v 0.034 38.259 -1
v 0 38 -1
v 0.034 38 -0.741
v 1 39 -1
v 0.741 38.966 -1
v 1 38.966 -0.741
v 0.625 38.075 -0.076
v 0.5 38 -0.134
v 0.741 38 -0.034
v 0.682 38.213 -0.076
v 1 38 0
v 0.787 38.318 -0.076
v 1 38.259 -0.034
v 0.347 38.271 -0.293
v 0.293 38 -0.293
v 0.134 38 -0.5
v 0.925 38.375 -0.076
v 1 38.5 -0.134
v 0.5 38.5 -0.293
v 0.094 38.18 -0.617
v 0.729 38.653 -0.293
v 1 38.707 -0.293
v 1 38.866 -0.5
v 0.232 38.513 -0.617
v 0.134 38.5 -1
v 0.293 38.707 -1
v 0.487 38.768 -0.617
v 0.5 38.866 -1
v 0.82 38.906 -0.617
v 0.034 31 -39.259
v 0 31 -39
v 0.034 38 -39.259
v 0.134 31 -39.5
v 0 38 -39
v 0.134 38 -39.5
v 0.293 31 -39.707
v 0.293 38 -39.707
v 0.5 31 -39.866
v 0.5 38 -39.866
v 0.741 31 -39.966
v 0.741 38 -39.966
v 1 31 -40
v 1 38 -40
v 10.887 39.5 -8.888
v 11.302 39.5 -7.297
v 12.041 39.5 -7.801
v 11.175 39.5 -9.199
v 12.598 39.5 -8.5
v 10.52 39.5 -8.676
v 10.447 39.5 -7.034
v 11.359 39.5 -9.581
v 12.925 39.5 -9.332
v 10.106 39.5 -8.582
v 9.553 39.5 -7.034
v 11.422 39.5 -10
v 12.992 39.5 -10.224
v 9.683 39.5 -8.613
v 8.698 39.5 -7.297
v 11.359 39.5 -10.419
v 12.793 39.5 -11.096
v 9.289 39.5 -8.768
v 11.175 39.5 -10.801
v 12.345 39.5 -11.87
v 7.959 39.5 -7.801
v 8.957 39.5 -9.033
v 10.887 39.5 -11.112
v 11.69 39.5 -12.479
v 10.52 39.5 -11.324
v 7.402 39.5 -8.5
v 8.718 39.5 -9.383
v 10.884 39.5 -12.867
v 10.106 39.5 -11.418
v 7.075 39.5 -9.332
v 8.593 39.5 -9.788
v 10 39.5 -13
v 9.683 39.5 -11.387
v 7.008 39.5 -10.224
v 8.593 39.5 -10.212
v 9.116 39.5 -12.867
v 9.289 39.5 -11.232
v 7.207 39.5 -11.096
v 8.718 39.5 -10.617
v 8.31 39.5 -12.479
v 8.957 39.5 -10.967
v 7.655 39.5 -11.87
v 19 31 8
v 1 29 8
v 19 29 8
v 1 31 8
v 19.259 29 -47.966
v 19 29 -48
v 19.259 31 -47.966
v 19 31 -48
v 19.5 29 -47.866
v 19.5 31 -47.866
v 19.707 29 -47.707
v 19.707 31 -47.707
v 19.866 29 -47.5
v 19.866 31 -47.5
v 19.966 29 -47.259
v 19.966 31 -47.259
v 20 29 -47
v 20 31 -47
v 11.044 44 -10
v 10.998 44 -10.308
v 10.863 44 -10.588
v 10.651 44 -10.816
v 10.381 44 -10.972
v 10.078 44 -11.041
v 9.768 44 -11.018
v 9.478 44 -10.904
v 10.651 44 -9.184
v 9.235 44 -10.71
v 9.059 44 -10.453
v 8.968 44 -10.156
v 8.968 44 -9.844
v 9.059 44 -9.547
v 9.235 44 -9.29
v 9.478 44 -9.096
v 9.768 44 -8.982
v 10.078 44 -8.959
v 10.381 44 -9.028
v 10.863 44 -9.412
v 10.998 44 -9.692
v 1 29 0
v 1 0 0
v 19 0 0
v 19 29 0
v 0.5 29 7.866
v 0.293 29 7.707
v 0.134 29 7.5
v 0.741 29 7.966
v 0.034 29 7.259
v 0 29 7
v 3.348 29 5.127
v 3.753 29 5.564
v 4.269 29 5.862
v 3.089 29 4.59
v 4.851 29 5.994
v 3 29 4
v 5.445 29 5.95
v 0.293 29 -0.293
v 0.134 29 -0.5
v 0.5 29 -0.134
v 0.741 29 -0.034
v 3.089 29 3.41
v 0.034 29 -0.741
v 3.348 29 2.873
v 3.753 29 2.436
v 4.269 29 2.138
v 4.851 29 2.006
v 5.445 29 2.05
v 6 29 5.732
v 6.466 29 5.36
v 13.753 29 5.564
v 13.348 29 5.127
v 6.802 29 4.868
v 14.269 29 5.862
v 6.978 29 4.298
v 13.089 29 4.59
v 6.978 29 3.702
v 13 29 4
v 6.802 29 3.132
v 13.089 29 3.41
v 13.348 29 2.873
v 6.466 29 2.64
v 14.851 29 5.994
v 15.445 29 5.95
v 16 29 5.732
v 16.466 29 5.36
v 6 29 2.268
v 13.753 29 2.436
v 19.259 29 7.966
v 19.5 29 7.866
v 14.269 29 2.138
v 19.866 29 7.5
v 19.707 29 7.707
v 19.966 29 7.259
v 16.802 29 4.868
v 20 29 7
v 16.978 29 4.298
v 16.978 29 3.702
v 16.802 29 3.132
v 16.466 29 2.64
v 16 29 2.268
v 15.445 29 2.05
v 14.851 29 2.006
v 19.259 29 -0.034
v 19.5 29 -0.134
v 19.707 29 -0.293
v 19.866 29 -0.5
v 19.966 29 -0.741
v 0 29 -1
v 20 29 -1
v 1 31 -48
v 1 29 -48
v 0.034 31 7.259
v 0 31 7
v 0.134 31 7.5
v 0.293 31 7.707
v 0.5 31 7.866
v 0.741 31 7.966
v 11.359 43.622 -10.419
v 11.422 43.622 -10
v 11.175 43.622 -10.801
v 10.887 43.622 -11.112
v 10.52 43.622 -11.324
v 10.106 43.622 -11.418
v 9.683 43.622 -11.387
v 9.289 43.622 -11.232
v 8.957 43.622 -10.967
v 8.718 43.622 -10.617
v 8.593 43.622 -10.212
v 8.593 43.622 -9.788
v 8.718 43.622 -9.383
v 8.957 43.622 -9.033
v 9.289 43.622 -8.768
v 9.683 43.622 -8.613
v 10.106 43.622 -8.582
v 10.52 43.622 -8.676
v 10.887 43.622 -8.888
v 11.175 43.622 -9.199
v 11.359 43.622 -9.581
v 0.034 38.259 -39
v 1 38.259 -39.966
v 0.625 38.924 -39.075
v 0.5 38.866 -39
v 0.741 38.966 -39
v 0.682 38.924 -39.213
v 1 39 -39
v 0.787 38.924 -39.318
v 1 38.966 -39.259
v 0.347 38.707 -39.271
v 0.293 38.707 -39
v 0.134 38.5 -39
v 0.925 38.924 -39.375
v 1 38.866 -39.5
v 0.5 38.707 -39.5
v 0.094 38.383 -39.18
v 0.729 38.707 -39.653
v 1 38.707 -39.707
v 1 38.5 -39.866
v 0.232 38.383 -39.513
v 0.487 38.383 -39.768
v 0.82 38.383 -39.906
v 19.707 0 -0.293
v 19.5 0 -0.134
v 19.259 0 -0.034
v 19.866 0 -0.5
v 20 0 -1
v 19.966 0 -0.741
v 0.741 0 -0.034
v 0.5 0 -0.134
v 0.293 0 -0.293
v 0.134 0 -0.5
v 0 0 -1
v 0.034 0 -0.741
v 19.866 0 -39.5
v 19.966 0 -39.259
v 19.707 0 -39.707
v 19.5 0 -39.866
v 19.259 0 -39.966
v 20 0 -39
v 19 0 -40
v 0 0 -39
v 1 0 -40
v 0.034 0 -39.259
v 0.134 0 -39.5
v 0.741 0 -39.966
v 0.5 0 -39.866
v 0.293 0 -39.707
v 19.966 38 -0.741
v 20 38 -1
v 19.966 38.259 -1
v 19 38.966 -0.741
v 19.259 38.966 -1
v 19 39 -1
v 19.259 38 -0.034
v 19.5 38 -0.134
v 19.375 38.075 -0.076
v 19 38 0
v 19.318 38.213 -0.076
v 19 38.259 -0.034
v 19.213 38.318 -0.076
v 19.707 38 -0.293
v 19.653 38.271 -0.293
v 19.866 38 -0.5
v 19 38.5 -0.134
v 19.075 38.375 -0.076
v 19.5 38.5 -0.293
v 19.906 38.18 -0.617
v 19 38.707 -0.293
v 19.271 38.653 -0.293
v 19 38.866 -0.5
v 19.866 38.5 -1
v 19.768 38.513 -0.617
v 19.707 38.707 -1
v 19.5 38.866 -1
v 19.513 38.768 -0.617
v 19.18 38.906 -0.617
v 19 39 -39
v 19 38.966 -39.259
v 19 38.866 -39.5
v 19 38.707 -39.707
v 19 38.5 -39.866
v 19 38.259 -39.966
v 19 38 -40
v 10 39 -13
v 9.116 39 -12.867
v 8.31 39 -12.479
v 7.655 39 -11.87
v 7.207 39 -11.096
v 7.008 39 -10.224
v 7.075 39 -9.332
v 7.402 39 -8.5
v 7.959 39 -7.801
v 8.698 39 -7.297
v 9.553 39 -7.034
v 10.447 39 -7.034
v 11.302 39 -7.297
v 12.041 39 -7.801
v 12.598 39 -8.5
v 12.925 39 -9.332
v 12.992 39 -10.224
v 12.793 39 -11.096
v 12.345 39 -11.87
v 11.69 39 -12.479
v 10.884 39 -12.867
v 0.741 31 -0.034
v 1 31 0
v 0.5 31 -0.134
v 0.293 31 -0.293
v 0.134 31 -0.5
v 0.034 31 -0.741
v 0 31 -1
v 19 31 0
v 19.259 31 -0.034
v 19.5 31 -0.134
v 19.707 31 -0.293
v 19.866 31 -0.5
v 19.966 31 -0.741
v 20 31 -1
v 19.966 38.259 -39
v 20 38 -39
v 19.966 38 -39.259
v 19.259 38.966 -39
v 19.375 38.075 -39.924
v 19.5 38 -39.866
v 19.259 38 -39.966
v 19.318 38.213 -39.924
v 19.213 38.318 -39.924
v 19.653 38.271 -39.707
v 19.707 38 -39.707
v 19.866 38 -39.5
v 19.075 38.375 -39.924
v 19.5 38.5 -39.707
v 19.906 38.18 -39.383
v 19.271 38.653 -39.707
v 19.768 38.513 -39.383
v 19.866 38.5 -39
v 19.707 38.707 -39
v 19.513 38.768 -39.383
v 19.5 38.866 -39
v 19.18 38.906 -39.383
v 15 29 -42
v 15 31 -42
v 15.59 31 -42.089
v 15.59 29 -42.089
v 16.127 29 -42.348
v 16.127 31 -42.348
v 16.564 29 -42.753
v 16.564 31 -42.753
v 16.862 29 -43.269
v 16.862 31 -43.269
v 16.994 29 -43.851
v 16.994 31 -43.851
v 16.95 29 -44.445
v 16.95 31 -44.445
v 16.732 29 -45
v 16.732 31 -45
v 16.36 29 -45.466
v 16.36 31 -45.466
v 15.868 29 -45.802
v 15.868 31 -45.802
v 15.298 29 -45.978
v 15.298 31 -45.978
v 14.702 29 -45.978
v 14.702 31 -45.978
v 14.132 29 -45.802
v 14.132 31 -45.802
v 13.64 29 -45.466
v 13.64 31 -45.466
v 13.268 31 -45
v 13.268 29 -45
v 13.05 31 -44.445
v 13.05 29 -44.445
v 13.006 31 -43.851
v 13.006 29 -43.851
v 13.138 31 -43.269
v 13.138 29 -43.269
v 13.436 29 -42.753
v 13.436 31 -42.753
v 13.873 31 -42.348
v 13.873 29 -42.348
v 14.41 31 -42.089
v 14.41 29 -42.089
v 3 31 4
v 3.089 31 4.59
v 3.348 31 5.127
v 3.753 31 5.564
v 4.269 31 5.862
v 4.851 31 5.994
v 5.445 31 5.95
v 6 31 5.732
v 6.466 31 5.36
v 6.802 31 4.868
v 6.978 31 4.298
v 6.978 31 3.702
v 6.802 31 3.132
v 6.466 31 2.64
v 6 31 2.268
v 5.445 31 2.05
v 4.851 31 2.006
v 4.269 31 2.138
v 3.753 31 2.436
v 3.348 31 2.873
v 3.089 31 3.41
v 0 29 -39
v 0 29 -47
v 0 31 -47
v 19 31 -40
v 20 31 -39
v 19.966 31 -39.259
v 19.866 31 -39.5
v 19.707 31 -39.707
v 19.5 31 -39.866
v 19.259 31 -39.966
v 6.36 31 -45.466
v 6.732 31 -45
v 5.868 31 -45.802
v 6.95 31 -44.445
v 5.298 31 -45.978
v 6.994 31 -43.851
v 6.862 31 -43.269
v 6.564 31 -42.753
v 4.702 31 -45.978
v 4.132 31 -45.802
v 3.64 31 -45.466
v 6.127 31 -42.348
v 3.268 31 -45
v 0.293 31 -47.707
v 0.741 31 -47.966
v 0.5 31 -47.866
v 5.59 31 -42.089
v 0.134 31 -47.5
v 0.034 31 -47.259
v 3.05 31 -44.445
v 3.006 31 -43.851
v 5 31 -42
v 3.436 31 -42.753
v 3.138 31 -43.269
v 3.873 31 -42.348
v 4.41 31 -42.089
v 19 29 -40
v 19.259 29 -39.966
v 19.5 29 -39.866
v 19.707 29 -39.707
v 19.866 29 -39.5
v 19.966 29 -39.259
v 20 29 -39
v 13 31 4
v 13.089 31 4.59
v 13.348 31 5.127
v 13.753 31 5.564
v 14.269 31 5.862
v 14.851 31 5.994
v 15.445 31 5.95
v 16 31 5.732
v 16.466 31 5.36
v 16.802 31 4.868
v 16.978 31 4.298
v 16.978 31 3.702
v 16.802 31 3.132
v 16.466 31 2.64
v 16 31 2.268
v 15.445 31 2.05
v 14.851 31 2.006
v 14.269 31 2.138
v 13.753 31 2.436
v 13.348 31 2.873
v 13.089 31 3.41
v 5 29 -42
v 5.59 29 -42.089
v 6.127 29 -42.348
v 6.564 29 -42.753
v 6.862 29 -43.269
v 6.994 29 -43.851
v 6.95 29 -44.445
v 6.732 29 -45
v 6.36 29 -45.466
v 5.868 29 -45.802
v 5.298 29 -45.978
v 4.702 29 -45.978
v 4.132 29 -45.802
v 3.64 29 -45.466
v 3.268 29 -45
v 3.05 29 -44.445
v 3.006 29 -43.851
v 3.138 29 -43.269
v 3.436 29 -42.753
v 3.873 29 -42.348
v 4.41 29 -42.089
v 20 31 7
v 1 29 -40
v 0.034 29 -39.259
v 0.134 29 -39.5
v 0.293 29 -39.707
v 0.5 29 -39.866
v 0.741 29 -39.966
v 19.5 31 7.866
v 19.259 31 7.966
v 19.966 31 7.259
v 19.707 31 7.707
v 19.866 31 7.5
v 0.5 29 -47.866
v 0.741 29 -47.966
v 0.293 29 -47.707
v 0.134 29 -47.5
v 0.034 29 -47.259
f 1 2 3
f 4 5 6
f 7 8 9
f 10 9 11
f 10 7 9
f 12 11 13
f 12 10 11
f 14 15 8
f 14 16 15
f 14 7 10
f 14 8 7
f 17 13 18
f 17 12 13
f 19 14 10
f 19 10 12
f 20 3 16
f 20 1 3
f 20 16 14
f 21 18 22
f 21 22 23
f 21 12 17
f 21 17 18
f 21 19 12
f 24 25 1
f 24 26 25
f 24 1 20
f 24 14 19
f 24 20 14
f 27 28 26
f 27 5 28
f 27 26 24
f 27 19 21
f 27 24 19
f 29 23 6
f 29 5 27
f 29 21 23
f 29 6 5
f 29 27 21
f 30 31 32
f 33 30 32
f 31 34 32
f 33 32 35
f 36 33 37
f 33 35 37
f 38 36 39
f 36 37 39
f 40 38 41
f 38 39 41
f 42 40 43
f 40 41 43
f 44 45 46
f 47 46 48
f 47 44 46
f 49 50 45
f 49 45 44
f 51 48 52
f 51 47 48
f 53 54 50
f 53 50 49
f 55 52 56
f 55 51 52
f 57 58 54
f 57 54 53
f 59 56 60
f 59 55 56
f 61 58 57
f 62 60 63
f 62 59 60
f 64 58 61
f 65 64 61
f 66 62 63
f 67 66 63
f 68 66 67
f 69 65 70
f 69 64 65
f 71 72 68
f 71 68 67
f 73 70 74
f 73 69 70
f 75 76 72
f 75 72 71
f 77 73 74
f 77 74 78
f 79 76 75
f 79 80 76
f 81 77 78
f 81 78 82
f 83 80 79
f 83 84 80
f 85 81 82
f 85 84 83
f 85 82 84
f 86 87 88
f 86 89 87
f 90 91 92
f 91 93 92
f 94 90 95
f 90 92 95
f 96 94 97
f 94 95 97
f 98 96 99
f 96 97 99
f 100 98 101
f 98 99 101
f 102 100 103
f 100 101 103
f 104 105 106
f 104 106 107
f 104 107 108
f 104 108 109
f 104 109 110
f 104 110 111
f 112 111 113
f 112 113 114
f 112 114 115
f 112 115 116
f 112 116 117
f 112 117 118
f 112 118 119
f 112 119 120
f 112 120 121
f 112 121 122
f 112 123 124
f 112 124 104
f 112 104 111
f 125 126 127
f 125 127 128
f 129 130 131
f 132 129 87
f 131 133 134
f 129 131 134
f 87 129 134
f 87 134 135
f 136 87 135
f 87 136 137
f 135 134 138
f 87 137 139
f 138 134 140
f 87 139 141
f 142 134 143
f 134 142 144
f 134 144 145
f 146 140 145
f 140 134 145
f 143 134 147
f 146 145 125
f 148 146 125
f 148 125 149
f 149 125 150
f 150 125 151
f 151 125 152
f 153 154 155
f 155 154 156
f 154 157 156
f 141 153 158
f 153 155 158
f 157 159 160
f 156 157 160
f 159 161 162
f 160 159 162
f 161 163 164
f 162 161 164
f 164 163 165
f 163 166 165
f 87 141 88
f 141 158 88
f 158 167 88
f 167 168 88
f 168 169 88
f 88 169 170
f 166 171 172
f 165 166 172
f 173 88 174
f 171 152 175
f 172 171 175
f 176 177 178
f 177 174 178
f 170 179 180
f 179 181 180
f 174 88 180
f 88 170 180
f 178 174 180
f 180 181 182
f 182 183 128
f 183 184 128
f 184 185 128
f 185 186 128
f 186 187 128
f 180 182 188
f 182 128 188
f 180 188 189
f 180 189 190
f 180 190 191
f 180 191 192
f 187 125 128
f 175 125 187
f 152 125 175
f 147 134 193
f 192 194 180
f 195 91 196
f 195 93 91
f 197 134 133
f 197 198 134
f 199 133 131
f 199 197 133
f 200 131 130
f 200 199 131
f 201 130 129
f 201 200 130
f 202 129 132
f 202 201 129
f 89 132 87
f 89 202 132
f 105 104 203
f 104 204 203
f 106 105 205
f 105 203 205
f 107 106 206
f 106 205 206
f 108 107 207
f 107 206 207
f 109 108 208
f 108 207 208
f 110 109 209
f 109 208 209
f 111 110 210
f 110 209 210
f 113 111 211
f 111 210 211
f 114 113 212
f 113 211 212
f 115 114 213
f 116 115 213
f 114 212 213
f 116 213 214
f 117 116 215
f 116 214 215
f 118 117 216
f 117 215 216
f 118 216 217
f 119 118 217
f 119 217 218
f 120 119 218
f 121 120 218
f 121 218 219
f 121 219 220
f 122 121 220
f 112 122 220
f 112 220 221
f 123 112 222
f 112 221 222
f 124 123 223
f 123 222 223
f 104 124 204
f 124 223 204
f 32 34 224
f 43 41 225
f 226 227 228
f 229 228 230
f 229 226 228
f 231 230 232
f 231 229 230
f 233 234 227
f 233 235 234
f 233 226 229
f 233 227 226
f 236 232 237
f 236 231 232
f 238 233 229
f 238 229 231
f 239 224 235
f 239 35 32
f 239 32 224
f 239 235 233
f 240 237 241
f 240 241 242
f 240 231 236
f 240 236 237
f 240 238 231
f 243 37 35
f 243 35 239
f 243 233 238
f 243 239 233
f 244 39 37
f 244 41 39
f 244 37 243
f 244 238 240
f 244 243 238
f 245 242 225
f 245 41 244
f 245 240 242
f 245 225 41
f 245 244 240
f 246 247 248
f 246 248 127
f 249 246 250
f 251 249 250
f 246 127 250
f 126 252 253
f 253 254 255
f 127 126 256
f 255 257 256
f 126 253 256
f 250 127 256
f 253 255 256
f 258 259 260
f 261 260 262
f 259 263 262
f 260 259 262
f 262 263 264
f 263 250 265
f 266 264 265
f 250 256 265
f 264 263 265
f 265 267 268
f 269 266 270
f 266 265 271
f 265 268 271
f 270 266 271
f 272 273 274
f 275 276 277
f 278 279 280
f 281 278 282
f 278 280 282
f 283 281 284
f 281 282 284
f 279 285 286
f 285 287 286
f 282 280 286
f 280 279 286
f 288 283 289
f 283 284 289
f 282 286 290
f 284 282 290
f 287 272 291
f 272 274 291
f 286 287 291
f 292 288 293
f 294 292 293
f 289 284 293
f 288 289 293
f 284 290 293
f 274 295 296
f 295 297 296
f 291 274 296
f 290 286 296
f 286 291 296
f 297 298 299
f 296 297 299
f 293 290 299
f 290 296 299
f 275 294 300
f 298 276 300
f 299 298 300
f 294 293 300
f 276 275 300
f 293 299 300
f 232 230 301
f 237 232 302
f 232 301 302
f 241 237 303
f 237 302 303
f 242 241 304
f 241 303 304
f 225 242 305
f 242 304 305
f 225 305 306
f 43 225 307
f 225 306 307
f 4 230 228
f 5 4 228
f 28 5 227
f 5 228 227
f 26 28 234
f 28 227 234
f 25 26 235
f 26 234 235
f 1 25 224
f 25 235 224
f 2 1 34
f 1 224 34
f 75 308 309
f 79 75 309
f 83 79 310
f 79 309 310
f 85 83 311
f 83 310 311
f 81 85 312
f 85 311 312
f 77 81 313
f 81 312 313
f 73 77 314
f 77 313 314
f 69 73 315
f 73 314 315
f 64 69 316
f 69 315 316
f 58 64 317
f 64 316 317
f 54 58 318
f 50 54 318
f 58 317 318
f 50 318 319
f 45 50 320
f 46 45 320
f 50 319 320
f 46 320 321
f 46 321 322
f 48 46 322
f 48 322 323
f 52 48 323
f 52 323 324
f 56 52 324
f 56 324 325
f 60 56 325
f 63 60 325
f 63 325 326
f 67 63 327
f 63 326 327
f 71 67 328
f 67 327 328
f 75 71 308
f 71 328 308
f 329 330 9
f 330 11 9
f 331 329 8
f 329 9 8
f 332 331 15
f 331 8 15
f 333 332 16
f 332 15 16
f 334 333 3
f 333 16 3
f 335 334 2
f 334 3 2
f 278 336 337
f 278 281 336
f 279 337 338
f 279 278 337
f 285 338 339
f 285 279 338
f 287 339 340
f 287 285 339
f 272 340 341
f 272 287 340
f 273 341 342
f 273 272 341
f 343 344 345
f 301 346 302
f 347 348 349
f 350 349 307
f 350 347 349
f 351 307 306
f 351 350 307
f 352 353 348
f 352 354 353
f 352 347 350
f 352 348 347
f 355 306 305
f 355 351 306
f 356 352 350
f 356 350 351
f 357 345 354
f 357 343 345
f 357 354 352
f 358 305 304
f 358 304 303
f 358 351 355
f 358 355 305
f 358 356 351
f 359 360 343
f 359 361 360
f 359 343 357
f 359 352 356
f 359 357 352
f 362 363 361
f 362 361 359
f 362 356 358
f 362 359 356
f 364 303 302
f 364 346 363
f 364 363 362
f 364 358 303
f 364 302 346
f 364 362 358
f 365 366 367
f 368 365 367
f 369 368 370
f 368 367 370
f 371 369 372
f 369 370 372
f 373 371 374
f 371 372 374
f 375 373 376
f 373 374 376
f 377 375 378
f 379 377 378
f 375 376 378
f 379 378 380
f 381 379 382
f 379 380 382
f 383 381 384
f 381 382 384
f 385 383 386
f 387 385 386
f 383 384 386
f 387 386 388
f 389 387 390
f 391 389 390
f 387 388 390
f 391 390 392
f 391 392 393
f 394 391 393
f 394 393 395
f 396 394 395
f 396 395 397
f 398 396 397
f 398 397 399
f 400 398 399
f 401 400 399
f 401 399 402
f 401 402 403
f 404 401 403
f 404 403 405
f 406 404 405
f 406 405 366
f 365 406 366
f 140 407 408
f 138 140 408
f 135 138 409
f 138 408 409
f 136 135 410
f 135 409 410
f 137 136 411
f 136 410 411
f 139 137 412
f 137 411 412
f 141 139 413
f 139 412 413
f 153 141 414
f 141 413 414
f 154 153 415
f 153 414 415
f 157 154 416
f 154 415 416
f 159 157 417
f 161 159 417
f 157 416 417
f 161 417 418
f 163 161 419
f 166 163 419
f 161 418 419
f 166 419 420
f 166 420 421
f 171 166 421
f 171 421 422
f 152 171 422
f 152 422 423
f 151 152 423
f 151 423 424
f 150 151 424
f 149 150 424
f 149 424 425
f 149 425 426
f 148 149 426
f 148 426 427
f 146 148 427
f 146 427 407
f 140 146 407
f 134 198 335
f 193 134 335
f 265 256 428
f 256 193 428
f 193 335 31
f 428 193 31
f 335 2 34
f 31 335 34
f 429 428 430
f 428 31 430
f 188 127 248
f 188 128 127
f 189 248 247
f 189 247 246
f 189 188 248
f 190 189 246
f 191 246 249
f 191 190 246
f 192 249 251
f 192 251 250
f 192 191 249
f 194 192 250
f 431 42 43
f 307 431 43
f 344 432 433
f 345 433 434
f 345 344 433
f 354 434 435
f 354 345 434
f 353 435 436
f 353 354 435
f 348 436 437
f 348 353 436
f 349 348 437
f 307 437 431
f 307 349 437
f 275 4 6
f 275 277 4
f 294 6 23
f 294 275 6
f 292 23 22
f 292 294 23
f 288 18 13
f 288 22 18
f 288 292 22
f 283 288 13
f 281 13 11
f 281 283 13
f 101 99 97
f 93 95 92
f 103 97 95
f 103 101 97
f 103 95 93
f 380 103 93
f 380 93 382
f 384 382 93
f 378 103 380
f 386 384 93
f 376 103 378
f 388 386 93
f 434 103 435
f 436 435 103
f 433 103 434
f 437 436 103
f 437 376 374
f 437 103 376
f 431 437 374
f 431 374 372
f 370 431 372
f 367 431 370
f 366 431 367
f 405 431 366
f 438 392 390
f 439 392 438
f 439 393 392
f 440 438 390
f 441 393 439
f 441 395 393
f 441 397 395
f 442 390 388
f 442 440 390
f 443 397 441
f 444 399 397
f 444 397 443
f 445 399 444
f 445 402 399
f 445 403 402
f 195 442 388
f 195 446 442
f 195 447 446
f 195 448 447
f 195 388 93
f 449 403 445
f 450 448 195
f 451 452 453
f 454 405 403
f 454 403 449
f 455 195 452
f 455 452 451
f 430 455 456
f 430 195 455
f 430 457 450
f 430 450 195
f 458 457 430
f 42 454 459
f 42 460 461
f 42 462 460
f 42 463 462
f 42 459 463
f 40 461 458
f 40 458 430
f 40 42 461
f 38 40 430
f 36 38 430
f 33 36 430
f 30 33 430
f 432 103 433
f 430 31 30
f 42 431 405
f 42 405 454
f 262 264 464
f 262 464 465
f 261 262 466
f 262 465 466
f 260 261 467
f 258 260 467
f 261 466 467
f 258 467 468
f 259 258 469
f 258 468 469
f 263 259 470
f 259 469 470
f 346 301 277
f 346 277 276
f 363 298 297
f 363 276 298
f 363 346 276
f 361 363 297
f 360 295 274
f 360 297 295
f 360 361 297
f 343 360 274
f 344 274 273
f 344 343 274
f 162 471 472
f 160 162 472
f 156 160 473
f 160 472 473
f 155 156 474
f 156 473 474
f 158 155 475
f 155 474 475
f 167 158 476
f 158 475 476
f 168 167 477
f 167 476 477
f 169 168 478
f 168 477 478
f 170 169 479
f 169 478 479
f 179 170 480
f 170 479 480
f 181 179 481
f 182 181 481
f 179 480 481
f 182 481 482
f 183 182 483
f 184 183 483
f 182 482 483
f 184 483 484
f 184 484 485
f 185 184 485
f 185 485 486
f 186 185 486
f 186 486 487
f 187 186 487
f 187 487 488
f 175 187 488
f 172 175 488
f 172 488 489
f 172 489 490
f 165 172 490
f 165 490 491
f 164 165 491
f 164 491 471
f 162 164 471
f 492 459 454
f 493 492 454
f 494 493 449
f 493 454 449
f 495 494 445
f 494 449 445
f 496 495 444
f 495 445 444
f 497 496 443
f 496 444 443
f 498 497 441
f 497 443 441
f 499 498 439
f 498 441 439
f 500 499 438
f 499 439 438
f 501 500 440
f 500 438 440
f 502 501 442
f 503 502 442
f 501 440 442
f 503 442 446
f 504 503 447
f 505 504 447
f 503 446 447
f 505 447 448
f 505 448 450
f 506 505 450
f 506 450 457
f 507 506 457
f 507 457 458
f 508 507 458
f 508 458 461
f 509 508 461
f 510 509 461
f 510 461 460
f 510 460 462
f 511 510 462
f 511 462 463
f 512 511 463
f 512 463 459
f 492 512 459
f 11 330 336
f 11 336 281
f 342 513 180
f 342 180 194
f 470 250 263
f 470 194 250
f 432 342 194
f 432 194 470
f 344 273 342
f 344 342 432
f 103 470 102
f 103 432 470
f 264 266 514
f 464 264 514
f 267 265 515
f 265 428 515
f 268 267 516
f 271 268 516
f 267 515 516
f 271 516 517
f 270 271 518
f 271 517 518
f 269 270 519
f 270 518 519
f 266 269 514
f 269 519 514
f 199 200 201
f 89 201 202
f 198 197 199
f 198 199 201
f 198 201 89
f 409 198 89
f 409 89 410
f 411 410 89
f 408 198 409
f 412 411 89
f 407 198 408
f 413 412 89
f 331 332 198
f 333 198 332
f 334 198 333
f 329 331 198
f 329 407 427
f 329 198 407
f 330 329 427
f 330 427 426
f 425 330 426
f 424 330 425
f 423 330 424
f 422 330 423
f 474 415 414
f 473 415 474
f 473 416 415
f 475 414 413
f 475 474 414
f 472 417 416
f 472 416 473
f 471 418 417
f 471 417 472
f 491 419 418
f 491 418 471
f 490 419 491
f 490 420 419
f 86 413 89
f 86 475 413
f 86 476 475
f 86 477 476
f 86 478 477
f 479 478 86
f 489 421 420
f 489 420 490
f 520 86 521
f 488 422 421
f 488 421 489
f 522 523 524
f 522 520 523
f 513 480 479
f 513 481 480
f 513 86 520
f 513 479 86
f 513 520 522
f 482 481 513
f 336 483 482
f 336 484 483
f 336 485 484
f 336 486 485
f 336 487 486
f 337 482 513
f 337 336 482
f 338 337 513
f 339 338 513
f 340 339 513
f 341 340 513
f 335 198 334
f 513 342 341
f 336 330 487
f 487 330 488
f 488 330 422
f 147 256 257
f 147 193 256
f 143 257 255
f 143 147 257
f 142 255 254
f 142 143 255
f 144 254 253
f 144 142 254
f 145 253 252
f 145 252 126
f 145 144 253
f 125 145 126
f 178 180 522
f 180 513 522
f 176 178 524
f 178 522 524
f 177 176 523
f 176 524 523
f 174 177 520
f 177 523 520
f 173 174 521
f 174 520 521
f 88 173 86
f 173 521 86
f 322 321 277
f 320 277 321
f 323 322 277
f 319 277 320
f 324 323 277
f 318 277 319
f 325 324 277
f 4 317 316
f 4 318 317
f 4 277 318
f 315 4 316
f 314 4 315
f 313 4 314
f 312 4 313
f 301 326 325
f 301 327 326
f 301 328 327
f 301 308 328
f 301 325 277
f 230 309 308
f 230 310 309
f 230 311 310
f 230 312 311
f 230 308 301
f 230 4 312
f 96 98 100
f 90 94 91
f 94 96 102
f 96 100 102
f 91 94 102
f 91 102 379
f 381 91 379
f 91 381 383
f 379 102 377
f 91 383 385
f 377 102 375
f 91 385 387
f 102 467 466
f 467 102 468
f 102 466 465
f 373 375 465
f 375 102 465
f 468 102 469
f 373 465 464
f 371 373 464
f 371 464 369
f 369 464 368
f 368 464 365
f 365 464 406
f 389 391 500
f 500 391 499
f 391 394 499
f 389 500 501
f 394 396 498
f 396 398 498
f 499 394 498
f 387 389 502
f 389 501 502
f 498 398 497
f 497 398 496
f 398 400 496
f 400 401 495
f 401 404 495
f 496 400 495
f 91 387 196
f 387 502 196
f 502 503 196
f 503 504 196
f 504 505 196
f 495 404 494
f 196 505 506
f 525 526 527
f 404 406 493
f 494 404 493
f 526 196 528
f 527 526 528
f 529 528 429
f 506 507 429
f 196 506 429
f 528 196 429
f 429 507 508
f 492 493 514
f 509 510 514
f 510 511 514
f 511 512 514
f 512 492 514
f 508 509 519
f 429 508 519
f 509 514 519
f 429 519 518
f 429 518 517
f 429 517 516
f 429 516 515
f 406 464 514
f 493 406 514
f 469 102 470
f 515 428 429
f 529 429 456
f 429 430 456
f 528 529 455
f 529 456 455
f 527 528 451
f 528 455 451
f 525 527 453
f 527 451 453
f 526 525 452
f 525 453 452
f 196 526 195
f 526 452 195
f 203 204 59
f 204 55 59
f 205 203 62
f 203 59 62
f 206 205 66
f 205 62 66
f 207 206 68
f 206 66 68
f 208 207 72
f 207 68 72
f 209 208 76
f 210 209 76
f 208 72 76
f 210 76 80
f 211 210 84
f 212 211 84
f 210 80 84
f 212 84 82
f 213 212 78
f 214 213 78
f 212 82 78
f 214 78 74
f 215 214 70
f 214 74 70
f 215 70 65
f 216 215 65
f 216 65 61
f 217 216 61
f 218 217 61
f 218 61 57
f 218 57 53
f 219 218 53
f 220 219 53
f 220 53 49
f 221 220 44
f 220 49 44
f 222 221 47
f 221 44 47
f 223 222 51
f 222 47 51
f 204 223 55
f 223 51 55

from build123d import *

# Parameters (mm, degrees)
SKETCH_1_W          = 40
SKETCH_1_H          = 39
EXTRUDE_1_DEPTH     = 20
SKETCH_2_W          = 20
SKETCH_2_H          = 2
EXTRUDE_2_DEPTH     = 8
SKETCH_3_W          = 20
SKETCH_3_H          = 2
EXTRUDE_3_DEPTH     = 8
CUT_EXTRUDE_3_REACH = 62.539
SKETCH_4_R          = 2
CUT_EXTRUDE_5_REACH = 62.539
SKETCH_5_R          = 2
SKETCH_7_R          = 3
EXTRUDE_5_DEPTH     = 0.5
SKETCH_9_R          = 1.5
EXTRUDE_6_DEPTH     = 5
FILLET_7_R          = 1
FILLET_8_R          = 1
FILLET_9_R          = 1
FILLET_10_R         = 1


# Read off the part's stored shape, not the designer's step: #4-40 机械螺纹 螺柱3
with BuildPart() as part:
    # 草图1 → 凸台-拉伸1 (new body)
    with BuildSketch(Plane(origin=(0, 0, 0), x_dir=(0, 0, -1), z_dir=(1, 0, 0))):
        with Locations((20, 19.5)):
            Rectangle(SKETCH_1_W, SKETCH_1_H)
    extrude(amount=EXTRUDE_1_DEPTH)

    # 草图2 → 凸台-拉伸2 (add)
    with BuildSketch(Plane.XY):
        with Locations((10, 30)):
            Rectangle(SKETCH_2_W, SKETCH_2_H)
    extrude(amount=EXTRUDE_2_DEPTH)

    # 草图3 → 凸台-拉伸3 (add)
    with BuildSketch(Plane(origin=(0, 0, -40), x_dir=(-1, 0, 0), z_dir=(0, 0, -1))):
        with Locations((-10, 30)):
            Rectangle(SKETCH_3_W, SKETCH_3_H)
    extrude(amount=EXTRUDE_3_DEPTH)

    # 草图4 → 切除-拉伸3 (cut, up to next)
    with BuildSketch(Plane(origin=(0, 31, 0), x_dir=(1, 0, 0), z_dir=(0, 1, 0)), mode=Mode.PRIVATE) as cut_extrude_3_sk1:
        with Locations(Location((5, -4, 0), (0, 0, 180))):
            Circle(SKETCH_4_R)
    cut_extrude_3_tool1 = extrude(cut_extrude_3_sk1.sketch, amount=-CUT_EXTRUDE_3_REACH, mode=Mode.PRIVATE) & part.part
    # 草图4 → 切除-拉伸3 (cut, up to next)
    with BuildSketch(Plane(origin=(0, 31, 0), x_dir=(1, 0, 0), z_dir=(0, 1, 0)), mode=Mode.PRIVATE) as cut_extrude_3_sk2:
        with Locations(Location((15, -4, 0), (0, 0, 180))):
            Circle(SKETCH_4_R)
    cut_extrude_3_tool2 = extrude(cut_extrude_3_sk2.sketch, amount=-CUT_EXTRUDE_3_REACH, mode=Mode.PRIVATE) & part.part
    add(cut_extrude_3_tool1.solids().sort_by_distance((5, 31, 4))[0], mode=Mode.SUBTRACT)
    add(cut_extrude_3_tool2.solids().sort_by_distance((15, 31, 4))[0], mode=Mode.SUBTRACT)

    # 草图5 → 切除-拉伸5 (cut, up to next)
    with BuildSketch(Plane(origin=(0, 31, 0), x_dir=(1, 0, 0), z_dir=(0, 1, 0)), mode=Mode.PRIVATE) as cut_extrude_5_sk1:
        with Locations(Location((5, 44, 0), (0, 0, 270))):
            Circle(SKETCH_5_R)
    cut_extrude_5_tool1 = extrude(cut_extrude_5_sk1.sketch, amount=-CUT_EXTRUDE_5_REACH, mode=Mode.PRIVATE) & part.part
    # 草图5 → 切除-拉伸5 (cut, up to next)
    with BuildSketch(Plane(origin=(0, 31, 0), x_dir=(1, 0, 0), z_dir=(0, 1, 0)), mode=Mode.PRIVATE) as cut_extrude_5_sk2:
        with Locations(Location((15, 44, 0), (0, 0, 270))):
            Circle(SKETCH_5_R)
    cut_extrude_5_tool2 = extrude(cut_extrude_5_sk2.sketch, amount=-CUT_EXTRUDE_5_REACH, mode=Mode.PRIVATE) & part.part
    add(cut_extrude_5_tool1.solids().sort_by_distance((5, 31, -44))[0], mode=Mode.SUBTRACT)
    add(cut_extrude_5_tool2.solids().sort_by_distance((15, 31, -44))[0], mode=Mode.SUBTRACT)

    # 草图7 → 凸台-拉伸5 (add)
    with BuildSketch(Plane(origin=(0, 39, 0), x_dir=(1, 0, 0), z_dir=(0, 1, 0))):
        with Locations(Location((10, 10, 0), (0, 0, 90))):
            Circle(SKETCH_7_R)
    extrude(amount=EXTRUDE_5_DEPTH)

    # 草图9 → 凸台-拉伸6 (add)
    with BuildSketch(Plane(origin=(0, 39, 0), x_dir=(1, 0, 0), z_dir=(0, 1, 0))):
        with Locations(Location((10, 10, 0), (0, 0, 270))):
            Circle(SKETCH_9_R)
    extrude(amount=EXTRUDE_6_DEPTH)

    # 圆角7
    fillet_7_edges = [part.edges().sort_by_distance(p)[0] for p in [
        (20, 39, -20),
        (0, 35, -40),
        (20, 35, -40),
        (20, 35, 0),
        (0, 39, -20),
        (0, 35, 0),
        (10, 39, 0),
        (10, 39, -40),
    ]]
    fillet(fillet_7_edges, radius=FILLET_7_R)

    # 圆角8
    fillet_8_edges = [part.edges().sort_by_distance(p)[0] for p in [
        (20, 30, 8),
        (0, 30, 8),
    ]]
    fillet(fillet_8_edges, radius=FILLET_8_R)

    # 圆角9
    fillet_9_edges = [part.edges().sort_by_distance(p)[0] for p in [
        (0, 30, -48),
        (20, 30, -48),
    ]]
    fillet(fillet_9_edges, radius=FILLET_9_R)

    # #4-40 机械螺纹 螺柱3 outline → #4-40 机械螺纹 螺柱3 (revolve, cut)
    with BuildSketch(Plane(origin=(10, 0, -10), x_dir=(1, 0, 0), z_dir=(0, 0, 1))):
        Polygon((1.5, 44), (1.04394, 44), (1.4224, 43.62154), (1.4224, 39.5), (1.5, 39.5), align=None)
    revolve(axis=Axis((10, 0, -10), (0, 1, 0)), mode=Mode.SUBTRACT)

    # 圆角10
    fillet_10_edges = [part.edges().sort_by_distance(p)[0] for p in [
        (20, 14.5, -40),
        (0, 14.5, 0),
        (20, 14.5, 0),
        (0, 14.5, -40),
    ]]
    fillet(fillet_10_edges, radius=FILLET_10_R)


solid = part.part
